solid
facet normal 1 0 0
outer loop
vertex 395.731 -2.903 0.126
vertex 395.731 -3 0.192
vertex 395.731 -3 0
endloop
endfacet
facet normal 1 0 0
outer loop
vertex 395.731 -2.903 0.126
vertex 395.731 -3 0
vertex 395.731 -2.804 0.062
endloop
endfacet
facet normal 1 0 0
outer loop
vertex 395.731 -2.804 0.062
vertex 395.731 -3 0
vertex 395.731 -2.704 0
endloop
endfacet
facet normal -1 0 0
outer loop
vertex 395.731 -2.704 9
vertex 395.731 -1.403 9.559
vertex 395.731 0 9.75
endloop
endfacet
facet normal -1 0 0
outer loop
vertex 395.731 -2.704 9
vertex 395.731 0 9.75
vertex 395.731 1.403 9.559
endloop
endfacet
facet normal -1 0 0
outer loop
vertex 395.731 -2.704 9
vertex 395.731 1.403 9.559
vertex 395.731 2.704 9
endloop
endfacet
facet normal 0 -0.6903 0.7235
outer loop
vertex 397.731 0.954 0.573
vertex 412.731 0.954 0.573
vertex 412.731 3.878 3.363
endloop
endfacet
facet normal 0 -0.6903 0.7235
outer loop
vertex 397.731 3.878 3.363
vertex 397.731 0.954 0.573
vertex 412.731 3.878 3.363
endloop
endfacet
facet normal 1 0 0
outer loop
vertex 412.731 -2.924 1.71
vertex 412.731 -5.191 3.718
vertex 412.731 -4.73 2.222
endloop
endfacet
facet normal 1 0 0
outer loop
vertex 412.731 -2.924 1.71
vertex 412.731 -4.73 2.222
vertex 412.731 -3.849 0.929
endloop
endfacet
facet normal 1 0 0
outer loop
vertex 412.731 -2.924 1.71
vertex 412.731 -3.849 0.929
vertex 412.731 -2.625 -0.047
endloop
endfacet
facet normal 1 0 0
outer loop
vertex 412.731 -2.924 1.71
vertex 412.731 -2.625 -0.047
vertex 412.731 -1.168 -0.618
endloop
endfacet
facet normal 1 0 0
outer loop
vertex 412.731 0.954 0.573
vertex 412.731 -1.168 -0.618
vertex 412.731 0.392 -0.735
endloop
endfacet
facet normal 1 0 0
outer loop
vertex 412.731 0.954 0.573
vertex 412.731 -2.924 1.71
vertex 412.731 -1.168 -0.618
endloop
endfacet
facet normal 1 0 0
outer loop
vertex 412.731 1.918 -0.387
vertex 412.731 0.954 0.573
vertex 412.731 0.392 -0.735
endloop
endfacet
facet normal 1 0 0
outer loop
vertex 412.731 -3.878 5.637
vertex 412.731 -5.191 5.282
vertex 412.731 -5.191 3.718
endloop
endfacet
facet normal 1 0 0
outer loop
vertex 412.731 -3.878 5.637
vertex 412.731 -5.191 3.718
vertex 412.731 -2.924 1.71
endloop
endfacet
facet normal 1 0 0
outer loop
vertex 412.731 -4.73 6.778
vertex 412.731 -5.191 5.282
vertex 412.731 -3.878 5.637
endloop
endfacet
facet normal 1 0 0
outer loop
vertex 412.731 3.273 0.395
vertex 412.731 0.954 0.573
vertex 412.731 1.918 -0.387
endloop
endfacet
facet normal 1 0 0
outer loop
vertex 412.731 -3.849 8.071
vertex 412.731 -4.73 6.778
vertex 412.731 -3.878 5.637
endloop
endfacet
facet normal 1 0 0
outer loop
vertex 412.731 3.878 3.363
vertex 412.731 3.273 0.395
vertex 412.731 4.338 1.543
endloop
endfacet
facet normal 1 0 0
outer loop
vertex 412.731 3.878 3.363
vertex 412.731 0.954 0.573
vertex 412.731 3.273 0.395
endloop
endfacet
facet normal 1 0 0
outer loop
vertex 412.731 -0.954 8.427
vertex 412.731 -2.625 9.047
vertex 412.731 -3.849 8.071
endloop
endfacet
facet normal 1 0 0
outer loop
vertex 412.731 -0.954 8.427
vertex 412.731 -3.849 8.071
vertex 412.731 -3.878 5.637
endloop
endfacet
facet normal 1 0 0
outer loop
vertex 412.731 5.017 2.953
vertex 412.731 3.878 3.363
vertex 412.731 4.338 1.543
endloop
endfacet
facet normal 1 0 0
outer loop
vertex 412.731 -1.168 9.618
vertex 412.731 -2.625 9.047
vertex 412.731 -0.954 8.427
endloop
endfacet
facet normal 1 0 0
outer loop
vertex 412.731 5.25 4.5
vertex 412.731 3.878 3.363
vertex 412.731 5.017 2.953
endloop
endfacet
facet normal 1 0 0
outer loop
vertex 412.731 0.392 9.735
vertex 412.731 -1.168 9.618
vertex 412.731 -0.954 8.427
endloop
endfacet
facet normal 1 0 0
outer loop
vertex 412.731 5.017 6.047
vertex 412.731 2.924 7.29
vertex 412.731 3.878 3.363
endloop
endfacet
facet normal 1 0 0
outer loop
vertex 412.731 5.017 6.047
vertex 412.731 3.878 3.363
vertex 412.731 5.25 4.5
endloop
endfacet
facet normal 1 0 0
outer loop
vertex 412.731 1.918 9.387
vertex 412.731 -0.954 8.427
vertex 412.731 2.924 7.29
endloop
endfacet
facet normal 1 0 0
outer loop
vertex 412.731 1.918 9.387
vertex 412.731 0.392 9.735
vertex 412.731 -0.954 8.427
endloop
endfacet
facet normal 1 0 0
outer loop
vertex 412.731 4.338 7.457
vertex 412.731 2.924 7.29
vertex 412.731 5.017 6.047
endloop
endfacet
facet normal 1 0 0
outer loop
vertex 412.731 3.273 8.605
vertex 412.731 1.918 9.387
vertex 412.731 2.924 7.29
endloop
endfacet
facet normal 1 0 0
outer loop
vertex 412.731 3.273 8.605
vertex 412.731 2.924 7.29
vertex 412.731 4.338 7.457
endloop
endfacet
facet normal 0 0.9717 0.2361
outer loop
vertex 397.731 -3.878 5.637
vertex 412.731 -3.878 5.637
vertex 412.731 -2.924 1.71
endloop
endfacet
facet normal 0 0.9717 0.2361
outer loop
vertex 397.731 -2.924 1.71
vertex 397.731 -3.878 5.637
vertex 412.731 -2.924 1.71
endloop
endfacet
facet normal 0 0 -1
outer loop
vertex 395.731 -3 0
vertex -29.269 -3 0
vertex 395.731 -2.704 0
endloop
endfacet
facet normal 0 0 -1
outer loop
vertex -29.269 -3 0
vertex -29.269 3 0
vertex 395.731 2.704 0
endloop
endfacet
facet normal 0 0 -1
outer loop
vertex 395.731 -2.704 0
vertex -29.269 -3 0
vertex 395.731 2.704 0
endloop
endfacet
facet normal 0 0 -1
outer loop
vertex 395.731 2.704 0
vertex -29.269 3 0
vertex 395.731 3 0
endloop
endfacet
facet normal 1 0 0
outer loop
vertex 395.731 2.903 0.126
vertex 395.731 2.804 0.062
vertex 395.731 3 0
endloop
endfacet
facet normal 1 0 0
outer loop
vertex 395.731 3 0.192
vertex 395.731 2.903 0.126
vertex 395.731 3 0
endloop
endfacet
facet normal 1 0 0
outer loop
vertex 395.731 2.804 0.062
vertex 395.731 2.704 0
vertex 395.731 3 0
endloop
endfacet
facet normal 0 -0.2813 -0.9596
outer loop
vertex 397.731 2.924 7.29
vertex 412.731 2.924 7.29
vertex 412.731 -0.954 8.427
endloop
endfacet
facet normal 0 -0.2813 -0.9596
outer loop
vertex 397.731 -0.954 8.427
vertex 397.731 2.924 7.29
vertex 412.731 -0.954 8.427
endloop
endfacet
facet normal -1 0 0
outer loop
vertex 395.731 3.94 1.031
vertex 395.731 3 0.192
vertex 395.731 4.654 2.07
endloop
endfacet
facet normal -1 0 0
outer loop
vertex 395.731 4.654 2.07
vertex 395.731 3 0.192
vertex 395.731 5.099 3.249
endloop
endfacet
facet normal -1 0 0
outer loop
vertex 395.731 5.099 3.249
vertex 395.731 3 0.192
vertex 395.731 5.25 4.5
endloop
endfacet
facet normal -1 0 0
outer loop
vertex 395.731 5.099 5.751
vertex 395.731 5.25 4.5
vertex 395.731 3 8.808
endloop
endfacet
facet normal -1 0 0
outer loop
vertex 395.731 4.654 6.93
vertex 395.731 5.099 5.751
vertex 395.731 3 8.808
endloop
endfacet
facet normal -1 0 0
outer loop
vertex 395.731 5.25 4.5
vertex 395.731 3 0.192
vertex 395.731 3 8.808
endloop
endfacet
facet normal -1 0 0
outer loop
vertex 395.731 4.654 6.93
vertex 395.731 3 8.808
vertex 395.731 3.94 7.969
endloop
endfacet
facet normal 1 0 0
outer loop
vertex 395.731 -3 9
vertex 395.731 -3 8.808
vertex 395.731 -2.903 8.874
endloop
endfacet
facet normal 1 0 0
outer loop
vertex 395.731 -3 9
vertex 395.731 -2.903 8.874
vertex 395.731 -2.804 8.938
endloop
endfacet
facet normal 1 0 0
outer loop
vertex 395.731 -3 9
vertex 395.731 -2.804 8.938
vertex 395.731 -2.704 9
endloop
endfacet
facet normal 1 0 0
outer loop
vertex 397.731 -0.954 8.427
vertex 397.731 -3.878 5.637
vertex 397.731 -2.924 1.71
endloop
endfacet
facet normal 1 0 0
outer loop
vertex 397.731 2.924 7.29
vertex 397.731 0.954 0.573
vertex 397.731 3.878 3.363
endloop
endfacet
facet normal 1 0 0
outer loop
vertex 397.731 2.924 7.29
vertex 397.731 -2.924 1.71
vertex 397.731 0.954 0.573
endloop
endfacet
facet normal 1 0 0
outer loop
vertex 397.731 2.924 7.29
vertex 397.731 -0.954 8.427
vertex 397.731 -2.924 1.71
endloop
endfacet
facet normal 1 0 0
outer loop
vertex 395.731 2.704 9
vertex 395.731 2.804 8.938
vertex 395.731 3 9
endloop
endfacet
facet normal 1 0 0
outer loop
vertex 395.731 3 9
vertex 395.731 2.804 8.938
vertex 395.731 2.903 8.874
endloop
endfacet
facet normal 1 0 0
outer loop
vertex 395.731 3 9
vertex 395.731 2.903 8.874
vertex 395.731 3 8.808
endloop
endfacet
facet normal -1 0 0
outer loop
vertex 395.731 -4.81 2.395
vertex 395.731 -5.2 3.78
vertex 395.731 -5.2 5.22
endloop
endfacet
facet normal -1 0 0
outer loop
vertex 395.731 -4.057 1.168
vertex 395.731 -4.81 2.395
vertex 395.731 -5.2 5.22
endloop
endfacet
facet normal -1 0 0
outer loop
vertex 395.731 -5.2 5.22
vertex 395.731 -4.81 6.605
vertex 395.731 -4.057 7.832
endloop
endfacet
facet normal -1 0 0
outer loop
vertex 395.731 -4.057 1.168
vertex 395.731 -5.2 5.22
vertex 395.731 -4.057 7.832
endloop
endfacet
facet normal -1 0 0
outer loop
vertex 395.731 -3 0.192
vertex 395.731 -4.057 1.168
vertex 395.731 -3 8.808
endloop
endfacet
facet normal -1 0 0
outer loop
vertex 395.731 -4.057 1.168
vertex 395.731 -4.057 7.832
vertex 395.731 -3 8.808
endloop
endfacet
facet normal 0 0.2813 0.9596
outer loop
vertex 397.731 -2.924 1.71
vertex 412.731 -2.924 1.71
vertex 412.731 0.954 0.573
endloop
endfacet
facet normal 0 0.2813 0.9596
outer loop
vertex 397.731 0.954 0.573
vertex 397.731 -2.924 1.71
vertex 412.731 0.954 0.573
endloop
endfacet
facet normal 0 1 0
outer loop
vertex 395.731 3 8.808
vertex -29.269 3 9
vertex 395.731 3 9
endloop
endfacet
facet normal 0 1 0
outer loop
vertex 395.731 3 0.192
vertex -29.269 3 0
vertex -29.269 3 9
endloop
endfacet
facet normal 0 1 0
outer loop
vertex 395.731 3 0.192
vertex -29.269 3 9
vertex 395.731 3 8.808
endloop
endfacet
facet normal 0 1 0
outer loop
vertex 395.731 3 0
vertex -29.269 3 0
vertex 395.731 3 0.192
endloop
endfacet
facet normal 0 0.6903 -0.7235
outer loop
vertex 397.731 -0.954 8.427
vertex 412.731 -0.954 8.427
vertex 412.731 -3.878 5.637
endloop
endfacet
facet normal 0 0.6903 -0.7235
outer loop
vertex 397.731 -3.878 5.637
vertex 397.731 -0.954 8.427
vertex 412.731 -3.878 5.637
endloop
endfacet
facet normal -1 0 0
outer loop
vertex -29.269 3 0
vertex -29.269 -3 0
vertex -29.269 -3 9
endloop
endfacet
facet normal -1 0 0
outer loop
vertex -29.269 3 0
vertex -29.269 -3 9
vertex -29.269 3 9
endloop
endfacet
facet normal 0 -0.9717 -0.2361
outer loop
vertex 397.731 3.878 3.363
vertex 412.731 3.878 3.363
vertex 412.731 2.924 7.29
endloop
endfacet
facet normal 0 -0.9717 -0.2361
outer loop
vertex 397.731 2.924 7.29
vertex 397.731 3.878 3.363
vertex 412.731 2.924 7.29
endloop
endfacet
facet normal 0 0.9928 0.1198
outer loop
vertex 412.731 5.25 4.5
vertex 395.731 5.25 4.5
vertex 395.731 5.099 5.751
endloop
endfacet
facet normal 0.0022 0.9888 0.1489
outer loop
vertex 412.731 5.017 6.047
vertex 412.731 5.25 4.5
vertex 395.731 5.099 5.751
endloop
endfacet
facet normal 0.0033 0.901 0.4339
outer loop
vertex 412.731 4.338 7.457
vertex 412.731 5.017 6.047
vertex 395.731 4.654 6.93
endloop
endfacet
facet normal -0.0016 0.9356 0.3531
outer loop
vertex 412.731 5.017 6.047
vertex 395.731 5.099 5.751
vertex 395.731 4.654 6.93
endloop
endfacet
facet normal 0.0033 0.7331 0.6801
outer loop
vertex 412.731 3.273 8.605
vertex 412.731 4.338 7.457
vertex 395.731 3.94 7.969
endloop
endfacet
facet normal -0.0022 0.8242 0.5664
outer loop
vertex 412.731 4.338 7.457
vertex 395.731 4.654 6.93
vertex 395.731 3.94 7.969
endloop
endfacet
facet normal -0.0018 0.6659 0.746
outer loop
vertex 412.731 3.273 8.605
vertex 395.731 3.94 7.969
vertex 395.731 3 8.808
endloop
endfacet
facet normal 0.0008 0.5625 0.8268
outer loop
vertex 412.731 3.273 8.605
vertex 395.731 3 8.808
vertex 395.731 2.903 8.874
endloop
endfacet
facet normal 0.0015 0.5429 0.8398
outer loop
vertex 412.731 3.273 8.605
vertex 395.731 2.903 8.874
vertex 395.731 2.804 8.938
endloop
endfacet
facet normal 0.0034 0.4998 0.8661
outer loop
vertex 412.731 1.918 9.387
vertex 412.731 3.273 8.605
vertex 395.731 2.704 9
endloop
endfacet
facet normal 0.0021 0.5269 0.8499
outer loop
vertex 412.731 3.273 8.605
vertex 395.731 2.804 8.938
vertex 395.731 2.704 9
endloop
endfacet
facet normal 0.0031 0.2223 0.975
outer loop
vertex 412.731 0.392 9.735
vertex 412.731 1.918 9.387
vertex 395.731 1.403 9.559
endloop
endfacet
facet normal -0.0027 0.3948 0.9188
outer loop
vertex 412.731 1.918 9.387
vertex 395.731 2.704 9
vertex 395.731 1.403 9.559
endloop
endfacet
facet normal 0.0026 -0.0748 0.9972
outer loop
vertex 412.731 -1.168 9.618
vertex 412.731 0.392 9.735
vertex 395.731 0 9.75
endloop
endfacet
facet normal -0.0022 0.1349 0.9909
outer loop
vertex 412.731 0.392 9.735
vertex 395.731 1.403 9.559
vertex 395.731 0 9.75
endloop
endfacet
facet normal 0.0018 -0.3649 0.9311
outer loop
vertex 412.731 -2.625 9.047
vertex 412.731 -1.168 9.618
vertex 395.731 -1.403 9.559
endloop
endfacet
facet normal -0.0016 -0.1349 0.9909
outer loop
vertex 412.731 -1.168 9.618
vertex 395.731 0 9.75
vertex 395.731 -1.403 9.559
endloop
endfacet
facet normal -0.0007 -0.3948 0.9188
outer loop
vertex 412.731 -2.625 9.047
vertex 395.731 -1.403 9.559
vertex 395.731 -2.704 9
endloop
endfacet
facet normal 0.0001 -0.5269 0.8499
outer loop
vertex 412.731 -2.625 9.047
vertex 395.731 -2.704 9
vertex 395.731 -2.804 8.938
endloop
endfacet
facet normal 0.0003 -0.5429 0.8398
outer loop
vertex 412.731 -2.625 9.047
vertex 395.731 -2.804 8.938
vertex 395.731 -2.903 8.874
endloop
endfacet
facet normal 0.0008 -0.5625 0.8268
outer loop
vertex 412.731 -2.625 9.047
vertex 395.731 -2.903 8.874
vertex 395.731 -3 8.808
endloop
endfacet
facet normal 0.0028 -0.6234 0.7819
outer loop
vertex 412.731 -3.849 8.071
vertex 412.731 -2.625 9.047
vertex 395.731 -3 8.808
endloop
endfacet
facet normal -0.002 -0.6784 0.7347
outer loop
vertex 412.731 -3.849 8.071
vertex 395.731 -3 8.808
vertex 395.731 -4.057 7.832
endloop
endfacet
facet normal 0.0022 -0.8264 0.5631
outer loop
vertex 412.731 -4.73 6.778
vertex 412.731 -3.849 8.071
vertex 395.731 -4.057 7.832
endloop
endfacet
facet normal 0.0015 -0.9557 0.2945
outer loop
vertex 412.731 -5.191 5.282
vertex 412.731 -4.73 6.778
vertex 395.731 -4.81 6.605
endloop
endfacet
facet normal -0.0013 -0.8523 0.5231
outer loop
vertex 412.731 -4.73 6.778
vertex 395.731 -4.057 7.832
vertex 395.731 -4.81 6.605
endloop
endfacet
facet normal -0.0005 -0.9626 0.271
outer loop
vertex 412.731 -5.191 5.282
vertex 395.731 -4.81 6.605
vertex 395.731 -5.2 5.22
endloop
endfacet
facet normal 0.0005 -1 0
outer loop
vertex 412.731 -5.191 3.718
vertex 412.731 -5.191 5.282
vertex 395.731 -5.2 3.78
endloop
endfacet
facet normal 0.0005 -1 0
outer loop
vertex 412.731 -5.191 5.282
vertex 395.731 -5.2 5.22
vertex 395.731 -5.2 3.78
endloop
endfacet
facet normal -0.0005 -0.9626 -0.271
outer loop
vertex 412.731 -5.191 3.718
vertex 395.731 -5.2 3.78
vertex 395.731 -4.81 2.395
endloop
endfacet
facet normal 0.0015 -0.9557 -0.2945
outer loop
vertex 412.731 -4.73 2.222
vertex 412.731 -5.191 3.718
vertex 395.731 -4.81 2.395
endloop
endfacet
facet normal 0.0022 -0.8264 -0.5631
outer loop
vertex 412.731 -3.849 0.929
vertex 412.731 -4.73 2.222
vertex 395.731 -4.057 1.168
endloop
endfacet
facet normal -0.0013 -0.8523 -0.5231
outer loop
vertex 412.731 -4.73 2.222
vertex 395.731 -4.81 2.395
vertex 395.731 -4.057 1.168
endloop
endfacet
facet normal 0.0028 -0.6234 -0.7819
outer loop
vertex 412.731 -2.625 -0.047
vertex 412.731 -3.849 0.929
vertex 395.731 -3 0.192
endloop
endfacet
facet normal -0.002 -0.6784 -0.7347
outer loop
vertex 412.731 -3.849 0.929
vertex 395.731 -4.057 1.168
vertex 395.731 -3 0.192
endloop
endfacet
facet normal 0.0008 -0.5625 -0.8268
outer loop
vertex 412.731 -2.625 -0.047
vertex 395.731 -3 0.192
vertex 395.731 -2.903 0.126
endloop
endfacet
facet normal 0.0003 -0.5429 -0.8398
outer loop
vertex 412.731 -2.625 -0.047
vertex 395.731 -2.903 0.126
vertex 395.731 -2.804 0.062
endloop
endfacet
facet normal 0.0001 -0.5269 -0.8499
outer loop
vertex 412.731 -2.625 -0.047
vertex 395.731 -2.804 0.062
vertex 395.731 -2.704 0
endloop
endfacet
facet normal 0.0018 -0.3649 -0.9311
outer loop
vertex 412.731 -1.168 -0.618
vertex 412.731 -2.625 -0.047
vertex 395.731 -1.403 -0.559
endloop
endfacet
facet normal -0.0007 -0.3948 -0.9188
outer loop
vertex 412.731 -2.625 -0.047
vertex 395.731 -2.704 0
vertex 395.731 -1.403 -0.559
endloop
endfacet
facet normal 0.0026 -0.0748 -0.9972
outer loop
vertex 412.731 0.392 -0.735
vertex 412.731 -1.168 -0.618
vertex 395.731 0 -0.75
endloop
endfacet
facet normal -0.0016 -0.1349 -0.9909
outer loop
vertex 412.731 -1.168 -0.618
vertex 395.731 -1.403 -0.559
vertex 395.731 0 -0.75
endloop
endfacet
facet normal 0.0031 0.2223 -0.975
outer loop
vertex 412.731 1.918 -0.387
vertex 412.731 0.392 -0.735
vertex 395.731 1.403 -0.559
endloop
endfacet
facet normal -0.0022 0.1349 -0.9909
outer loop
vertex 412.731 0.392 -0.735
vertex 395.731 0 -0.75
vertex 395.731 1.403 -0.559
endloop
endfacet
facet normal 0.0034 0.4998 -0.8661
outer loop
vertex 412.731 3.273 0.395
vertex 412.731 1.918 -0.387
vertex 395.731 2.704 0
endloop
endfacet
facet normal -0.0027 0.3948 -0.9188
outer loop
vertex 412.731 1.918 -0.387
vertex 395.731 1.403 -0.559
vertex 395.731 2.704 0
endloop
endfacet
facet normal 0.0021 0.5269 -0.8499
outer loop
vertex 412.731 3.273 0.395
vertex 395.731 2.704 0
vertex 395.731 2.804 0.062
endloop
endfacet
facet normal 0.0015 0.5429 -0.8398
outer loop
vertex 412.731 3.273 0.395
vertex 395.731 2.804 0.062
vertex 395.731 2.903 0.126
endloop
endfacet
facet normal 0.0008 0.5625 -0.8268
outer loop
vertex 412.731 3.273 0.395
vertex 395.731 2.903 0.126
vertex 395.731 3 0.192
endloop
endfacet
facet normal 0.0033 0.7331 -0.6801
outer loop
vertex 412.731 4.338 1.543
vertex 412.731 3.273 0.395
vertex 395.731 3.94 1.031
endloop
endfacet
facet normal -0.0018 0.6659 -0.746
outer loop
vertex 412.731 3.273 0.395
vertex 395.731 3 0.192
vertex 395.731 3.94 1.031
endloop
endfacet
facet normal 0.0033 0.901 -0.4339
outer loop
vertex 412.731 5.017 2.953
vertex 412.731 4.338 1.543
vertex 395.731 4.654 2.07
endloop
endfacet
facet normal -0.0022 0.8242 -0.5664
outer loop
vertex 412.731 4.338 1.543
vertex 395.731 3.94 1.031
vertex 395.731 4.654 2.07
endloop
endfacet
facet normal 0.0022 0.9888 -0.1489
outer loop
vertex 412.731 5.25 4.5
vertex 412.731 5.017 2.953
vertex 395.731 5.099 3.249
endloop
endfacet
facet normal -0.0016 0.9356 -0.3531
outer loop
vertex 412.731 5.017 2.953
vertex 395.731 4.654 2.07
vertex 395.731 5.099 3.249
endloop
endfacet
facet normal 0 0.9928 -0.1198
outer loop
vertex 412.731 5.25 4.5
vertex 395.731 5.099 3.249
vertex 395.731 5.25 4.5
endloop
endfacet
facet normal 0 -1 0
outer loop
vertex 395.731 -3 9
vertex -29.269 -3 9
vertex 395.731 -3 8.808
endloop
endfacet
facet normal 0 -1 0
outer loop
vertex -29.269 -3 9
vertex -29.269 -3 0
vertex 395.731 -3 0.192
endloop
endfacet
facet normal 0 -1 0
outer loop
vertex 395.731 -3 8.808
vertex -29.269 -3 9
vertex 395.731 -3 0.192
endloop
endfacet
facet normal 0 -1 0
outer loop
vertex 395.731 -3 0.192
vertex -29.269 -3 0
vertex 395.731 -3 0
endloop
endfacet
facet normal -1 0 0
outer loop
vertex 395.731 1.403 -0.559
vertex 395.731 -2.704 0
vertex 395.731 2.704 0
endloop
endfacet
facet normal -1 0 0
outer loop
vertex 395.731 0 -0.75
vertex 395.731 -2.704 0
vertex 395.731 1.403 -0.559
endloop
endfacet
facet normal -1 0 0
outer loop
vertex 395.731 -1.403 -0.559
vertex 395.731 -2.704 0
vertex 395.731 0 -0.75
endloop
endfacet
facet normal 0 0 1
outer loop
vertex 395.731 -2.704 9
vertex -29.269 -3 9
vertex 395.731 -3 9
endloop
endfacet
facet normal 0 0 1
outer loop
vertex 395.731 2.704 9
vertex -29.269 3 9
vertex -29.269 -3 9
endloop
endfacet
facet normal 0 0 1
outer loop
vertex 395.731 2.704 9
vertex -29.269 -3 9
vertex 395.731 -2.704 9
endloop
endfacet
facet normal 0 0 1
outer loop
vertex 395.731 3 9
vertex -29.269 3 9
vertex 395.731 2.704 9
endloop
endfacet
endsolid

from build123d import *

# Parameters (mm, degrees)
F0_W     = 425
F0_H     = 6
F1_DEPTH = 9
F2_R     = 5.25
F3_DEPTH = 17
F5_DEPTH = 15


with BuildPart() as f1:
    # F0 (on Top) → F1 (new body)
    with BuildSketch(Plane.XY):
        with Locations((183.231094, 0)):
            Rectangle(F0_W, F0_H)
    extrude(amount=F1_DEPTH)

    # F2 (on face) → F3 (join)
    with BuildSketch(Plane.YZ.offset(395.731094)):
        with Locations((0, 4.5)):
            Circle(F2_R)
    extrude(amount=F3_DEPTH)

    # F4 (on face) → F5 (cut)
    with BuildSketch(Plane.YZ.offset(412.731094)):
        Polygon((0.954272, 0.572826), (3.878169, 3.362837), (2.923896, 7.290011), (-0.954272, 8.427174), (-3.878169, 5.637163), (-2.923896, 1.709989), align=None)
    extrude(amount=-F5_DEPTH, mode=Mode.SUBTRACT)


solid = f1.part
